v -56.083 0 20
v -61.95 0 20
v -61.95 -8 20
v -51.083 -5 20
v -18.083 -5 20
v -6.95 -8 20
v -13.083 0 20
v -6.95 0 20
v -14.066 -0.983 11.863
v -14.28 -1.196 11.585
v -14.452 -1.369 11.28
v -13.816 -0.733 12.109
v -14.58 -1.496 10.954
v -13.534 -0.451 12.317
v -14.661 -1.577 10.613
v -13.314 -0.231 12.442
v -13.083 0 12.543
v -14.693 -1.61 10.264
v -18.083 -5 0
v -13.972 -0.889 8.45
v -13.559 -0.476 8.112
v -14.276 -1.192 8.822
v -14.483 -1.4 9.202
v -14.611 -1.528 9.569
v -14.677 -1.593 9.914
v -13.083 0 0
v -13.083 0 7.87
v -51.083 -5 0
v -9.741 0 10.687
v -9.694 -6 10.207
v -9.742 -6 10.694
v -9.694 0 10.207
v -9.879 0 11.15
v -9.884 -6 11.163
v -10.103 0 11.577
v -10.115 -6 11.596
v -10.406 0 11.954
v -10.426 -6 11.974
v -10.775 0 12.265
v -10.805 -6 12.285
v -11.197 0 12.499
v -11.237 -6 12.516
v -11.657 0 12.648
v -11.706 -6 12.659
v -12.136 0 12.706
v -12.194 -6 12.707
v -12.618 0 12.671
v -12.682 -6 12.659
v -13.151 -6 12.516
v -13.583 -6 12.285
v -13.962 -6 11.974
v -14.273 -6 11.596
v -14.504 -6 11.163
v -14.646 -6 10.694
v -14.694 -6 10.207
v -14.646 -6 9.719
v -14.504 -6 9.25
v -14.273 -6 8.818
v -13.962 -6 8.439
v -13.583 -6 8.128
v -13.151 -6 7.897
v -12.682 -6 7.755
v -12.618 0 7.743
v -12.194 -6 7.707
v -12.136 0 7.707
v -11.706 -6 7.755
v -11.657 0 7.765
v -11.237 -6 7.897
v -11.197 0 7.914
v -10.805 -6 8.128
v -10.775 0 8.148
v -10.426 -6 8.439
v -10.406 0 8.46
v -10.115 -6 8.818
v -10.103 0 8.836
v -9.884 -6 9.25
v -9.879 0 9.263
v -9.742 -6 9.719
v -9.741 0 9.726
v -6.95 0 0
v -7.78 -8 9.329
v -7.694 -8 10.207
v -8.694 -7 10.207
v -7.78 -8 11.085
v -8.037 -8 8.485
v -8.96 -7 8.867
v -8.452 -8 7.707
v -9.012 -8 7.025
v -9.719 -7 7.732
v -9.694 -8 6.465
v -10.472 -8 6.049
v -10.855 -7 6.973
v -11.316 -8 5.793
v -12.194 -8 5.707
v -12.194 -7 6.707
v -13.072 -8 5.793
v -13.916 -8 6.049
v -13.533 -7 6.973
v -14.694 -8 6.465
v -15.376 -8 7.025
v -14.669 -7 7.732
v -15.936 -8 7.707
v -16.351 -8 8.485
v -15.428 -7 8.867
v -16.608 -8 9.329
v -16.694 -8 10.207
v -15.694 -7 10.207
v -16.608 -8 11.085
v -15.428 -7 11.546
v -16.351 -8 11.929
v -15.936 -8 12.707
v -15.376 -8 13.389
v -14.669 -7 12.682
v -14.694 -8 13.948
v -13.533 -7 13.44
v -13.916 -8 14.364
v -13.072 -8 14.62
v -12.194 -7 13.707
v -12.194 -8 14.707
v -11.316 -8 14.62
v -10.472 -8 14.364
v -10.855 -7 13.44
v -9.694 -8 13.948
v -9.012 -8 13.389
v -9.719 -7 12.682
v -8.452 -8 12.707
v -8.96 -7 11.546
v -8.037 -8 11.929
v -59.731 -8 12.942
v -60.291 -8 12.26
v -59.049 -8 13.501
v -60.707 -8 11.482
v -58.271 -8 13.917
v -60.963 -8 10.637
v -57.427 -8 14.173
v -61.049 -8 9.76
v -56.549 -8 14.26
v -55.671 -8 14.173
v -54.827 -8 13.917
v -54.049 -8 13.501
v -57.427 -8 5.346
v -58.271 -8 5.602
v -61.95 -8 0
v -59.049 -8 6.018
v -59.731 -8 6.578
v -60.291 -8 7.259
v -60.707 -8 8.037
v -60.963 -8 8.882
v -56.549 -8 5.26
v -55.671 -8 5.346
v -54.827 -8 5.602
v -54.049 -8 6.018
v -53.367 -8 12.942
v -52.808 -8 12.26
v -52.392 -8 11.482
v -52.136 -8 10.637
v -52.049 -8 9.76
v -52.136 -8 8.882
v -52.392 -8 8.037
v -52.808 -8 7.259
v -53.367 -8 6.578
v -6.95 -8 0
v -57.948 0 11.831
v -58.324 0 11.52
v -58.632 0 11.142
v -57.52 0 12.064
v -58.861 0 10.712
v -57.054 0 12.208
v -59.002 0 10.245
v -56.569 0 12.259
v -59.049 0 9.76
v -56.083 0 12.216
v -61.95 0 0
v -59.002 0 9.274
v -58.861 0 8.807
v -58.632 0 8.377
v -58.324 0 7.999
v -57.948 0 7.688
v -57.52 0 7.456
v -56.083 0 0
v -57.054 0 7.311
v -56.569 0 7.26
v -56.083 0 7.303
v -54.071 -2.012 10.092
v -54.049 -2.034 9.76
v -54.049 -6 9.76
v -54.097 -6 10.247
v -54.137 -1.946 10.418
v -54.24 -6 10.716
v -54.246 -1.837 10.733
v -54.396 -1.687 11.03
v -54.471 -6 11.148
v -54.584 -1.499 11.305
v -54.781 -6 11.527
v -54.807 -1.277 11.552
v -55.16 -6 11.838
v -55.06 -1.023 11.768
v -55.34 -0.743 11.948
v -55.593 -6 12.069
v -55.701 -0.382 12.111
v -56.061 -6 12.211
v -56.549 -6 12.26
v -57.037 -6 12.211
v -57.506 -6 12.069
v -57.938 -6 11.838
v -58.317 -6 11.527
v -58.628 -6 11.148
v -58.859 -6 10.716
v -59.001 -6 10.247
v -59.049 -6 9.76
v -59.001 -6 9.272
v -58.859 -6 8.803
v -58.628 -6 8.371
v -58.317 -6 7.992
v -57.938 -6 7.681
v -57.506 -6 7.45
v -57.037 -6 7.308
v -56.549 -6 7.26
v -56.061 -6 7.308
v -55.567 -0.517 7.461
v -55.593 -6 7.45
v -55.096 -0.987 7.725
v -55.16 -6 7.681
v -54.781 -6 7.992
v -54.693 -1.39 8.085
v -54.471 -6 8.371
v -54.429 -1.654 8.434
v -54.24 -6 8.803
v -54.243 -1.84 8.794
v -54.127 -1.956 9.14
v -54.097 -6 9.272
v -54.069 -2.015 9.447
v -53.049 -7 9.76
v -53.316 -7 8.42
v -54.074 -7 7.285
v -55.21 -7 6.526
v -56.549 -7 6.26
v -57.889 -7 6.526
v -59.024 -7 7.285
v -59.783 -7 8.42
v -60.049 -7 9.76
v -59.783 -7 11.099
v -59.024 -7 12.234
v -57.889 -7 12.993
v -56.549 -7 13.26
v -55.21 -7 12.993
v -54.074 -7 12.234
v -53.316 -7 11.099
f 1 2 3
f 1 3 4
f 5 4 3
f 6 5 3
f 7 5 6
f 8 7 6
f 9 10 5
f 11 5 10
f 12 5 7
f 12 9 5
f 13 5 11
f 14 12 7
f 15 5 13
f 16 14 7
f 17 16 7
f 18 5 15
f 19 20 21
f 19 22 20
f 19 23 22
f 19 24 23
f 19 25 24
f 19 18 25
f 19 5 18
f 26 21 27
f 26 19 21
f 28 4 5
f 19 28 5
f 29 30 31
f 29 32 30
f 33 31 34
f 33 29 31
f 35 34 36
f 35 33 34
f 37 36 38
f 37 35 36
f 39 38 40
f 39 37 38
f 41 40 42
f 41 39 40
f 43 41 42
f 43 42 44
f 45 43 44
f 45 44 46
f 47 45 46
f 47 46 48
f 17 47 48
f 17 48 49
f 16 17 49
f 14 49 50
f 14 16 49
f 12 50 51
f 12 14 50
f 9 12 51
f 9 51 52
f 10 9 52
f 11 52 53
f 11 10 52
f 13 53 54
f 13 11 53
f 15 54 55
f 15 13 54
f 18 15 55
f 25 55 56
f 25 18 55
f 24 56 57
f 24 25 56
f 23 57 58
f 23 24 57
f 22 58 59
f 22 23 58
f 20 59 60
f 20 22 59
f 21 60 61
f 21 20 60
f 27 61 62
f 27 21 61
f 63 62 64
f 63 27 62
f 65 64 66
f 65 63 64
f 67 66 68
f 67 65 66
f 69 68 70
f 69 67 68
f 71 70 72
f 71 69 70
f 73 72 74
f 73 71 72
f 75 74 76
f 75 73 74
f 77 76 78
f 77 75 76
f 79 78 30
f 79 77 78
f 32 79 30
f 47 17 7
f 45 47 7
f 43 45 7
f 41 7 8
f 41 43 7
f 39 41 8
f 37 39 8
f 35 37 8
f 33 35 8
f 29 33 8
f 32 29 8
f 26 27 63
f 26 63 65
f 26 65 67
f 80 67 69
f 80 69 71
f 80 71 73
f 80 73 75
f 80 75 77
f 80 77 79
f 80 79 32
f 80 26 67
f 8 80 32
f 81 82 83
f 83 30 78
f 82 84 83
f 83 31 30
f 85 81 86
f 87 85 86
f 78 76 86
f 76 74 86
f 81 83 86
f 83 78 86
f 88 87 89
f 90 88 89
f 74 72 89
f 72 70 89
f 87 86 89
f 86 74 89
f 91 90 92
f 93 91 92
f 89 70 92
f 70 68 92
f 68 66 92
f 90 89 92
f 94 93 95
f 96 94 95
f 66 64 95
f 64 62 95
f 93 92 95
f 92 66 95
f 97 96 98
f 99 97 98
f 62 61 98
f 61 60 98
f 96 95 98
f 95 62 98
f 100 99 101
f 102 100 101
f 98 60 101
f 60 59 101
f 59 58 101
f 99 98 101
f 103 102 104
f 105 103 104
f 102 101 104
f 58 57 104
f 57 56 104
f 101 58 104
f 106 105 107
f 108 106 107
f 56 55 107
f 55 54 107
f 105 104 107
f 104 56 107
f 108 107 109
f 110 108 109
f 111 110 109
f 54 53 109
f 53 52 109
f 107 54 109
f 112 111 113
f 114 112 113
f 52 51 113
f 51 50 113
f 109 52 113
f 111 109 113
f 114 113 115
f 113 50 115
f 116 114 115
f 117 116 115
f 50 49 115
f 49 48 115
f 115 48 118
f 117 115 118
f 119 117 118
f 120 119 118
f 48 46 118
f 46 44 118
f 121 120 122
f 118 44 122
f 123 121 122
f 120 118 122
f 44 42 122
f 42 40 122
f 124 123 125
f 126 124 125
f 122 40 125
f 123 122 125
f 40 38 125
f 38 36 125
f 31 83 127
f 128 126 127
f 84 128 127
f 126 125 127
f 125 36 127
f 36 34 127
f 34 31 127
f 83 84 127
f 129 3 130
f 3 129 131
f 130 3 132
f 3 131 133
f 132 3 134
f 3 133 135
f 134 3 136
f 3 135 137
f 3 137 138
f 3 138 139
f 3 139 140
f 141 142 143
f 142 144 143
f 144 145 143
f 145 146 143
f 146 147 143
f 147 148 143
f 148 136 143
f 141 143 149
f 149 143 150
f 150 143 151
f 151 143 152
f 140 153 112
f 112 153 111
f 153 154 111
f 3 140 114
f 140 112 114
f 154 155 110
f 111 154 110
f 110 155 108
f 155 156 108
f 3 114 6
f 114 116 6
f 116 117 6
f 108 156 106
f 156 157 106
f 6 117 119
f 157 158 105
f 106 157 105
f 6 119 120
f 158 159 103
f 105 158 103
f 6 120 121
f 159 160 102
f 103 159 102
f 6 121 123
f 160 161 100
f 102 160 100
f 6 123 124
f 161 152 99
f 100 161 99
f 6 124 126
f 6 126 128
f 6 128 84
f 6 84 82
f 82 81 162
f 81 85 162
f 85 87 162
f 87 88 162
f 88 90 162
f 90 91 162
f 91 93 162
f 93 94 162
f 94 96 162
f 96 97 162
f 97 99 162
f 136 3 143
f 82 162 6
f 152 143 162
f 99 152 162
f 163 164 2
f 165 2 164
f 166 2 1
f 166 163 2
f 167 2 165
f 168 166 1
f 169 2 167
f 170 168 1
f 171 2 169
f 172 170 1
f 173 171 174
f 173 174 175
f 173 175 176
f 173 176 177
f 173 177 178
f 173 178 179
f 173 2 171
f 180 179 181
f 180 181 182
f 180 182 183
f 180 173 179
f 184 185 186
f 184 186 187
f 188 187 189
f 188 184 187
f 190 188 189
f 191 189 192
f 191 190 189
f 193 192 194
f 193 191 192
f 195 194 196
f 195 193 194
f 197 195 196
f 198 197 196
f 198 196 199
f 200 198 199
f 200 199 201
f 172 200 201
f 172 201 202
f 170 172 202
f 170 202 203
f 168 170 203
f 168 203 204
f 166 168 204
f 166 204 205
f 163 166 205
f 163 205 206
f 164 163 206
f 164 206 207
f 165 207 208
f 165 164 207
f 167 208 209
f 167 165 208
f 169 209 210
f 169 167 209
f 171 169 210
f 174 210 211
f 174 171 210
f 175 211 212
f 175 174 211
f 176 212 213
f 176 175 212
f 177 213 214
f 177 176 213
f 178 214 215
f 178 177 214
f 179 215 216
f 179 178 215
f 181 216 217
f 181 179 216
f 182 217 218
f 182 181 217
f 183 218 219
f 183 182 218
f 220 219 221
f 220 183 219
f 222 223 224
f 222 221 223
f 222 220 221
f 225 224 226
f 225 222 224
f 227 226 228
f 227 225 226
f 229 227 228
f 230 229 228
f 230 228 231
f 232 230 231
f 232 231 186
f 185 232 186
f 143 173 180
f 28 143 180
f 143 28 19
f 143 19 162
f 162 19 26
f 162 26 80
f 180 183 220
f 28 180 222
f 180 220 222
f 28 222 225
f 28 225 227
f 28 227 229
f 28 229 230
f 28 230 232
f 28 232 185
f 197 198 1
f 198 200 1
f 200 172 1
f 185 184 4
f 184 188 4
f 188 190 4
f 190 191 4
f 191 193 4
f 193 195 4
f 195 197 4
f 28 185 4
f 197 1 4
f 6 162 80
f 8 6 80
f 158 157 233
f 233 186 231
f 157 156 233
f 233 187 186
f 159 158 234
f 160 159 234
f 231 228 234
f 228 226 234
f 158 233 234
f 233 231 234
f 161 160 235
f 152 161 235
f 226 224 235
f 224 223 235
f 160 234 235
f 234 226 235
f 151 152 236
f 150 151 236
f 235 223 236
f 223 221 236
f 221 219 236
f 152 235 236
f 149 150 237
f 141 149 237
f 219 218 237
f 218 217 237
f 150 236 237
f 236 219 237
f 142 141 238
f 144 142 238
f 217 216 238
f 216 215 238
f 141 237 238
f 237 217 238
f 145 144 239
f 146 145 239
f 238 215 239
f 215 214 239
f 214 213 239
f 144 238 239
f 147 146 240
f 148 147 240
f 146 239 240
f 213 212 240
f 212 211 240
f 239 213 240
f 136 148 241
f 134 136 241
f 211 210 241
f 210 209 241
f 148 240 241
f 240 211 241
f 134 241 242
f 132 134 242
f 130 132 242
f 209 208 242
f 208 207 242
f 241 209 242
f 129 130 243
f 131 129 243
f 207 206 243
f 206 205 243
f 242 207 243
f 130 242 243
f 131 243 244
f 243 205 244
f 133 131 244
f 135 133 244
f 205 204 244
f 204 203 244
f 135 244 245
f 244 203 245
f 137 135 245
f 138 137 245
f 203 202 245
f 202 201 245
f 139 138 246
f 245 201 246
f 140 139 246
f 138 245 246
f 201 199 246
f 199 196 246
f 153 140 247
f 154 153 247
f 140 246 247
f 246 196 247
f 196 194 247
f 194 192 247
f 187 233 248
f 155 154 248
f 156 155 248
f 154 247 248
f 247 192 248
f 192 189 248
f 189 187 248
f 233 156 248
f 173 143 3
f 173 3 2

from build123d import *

# Parameters (mm, degrees)
F0_W        = 55
F0_H        = 8
F1_DEPTH    = 20
F2_R        = 2.5
F3_DEPTH    = 35.3
F4_W        = 33
F4_H        = 86
F5_DEPTH    = 5
F6_SIZE     = 2
F7_SIZE     = 2
F8_T4_DEPTH = 45.7168298797
F8_T9_DEPTH = 45.7168298797


# Not quite as in the source:
# - a fillet or chamfer that OpenCascade refuses, or shapes differently, is made with other operations: its cross-section is extruded or revolved along the edge and cut away or added


with BuildPart() as f1:
    # F0 (on Top) → F1 (new body)
    with BuildSketch(Plane.XY):
        with Locations((-34.4500018656, -4)):
            Rectangle(F0_W, F0_H)
    extrude(amount=F1_DEPTH)

    # F2 (on Front) → F3 (cut)
    with BuildSketch(Plane.XZ):
        with Locations((-56.5492250025, 9.7595239058)):
            Circle(F2_R)
        with Locations((-12.1940001845, 10.2066537365)):
            Circle(F2_R)
    extrude(amount=F3_DEPTH, mode=Mode.SUBTRACT)

    # F4 (on Front) → F5 (cut)
    with BuildSketch(Plane.XZ):
        with Locations((-34.5833339691, 26.0833319575)):
            Rectangle(F4_W, F4_H)
    extrude(amount=F5_DEPTH, mode=Mode.SUBTRACT)

    # F6
    f6_edges = [f1.edges().sort_by_distance(p)[0] for p in [
        (-14.694, -8, 10.206654),
    ]]
    chamfer(f6_edges, length=F6_SIZE)

    # F7
    f7_edges = [f1.edges().sort_by_distance(p)[0] for p in [
        (-59.049225, -8, 9.759524),
    ]]
    chamfer(f7_edges, length=F7_SIZE)

    # F8: chamfer of 5 on 2 edges, made by hand


with BuildPart() as f8_tool2:
    # F8_s3 → F8_t4 (new body)
    with BuildSketch(Plane.XY.offset(32.8584149398)):
        Polygon((-56.0833339691, 0), (-51.0833339691, -5), (-51.0833339691, 0), align=None)
    extrude(amount=-F8_T4_DEPTH)

    split(bisect_by=Plane.XZ.offset(5), keep=Keep.BOTTOM)


with BuildPart() as f1_1:
    add(f1.part)

    # F8_t1: cut F8_tool2
    add(f8_tool2.part, mode=Mode.SUBTRACT)


with BuildPart() as f8_tool7:
    # F8_s8 → F8_t9 (new body)
    with BuildSketch(Plane.XY.offset(-12.8584149398)):
        Polygon((-18.0833339691, -5), (-13.0833339691, 0), (-18.0833339691, 0), align=None)
    extrude(amount=F8_T9_DEPTH)

    split(bisect_by=Plane.XZ.offset(5), keep=Keep.BOTTOM)


with BuildPart() as f1_2:
    add(f1_1.part)

    # F8_t6: cut F8_tool7
    add(f8_tool7.part, mode=Mode.SUBTRACT)


solid = f1_2.part
